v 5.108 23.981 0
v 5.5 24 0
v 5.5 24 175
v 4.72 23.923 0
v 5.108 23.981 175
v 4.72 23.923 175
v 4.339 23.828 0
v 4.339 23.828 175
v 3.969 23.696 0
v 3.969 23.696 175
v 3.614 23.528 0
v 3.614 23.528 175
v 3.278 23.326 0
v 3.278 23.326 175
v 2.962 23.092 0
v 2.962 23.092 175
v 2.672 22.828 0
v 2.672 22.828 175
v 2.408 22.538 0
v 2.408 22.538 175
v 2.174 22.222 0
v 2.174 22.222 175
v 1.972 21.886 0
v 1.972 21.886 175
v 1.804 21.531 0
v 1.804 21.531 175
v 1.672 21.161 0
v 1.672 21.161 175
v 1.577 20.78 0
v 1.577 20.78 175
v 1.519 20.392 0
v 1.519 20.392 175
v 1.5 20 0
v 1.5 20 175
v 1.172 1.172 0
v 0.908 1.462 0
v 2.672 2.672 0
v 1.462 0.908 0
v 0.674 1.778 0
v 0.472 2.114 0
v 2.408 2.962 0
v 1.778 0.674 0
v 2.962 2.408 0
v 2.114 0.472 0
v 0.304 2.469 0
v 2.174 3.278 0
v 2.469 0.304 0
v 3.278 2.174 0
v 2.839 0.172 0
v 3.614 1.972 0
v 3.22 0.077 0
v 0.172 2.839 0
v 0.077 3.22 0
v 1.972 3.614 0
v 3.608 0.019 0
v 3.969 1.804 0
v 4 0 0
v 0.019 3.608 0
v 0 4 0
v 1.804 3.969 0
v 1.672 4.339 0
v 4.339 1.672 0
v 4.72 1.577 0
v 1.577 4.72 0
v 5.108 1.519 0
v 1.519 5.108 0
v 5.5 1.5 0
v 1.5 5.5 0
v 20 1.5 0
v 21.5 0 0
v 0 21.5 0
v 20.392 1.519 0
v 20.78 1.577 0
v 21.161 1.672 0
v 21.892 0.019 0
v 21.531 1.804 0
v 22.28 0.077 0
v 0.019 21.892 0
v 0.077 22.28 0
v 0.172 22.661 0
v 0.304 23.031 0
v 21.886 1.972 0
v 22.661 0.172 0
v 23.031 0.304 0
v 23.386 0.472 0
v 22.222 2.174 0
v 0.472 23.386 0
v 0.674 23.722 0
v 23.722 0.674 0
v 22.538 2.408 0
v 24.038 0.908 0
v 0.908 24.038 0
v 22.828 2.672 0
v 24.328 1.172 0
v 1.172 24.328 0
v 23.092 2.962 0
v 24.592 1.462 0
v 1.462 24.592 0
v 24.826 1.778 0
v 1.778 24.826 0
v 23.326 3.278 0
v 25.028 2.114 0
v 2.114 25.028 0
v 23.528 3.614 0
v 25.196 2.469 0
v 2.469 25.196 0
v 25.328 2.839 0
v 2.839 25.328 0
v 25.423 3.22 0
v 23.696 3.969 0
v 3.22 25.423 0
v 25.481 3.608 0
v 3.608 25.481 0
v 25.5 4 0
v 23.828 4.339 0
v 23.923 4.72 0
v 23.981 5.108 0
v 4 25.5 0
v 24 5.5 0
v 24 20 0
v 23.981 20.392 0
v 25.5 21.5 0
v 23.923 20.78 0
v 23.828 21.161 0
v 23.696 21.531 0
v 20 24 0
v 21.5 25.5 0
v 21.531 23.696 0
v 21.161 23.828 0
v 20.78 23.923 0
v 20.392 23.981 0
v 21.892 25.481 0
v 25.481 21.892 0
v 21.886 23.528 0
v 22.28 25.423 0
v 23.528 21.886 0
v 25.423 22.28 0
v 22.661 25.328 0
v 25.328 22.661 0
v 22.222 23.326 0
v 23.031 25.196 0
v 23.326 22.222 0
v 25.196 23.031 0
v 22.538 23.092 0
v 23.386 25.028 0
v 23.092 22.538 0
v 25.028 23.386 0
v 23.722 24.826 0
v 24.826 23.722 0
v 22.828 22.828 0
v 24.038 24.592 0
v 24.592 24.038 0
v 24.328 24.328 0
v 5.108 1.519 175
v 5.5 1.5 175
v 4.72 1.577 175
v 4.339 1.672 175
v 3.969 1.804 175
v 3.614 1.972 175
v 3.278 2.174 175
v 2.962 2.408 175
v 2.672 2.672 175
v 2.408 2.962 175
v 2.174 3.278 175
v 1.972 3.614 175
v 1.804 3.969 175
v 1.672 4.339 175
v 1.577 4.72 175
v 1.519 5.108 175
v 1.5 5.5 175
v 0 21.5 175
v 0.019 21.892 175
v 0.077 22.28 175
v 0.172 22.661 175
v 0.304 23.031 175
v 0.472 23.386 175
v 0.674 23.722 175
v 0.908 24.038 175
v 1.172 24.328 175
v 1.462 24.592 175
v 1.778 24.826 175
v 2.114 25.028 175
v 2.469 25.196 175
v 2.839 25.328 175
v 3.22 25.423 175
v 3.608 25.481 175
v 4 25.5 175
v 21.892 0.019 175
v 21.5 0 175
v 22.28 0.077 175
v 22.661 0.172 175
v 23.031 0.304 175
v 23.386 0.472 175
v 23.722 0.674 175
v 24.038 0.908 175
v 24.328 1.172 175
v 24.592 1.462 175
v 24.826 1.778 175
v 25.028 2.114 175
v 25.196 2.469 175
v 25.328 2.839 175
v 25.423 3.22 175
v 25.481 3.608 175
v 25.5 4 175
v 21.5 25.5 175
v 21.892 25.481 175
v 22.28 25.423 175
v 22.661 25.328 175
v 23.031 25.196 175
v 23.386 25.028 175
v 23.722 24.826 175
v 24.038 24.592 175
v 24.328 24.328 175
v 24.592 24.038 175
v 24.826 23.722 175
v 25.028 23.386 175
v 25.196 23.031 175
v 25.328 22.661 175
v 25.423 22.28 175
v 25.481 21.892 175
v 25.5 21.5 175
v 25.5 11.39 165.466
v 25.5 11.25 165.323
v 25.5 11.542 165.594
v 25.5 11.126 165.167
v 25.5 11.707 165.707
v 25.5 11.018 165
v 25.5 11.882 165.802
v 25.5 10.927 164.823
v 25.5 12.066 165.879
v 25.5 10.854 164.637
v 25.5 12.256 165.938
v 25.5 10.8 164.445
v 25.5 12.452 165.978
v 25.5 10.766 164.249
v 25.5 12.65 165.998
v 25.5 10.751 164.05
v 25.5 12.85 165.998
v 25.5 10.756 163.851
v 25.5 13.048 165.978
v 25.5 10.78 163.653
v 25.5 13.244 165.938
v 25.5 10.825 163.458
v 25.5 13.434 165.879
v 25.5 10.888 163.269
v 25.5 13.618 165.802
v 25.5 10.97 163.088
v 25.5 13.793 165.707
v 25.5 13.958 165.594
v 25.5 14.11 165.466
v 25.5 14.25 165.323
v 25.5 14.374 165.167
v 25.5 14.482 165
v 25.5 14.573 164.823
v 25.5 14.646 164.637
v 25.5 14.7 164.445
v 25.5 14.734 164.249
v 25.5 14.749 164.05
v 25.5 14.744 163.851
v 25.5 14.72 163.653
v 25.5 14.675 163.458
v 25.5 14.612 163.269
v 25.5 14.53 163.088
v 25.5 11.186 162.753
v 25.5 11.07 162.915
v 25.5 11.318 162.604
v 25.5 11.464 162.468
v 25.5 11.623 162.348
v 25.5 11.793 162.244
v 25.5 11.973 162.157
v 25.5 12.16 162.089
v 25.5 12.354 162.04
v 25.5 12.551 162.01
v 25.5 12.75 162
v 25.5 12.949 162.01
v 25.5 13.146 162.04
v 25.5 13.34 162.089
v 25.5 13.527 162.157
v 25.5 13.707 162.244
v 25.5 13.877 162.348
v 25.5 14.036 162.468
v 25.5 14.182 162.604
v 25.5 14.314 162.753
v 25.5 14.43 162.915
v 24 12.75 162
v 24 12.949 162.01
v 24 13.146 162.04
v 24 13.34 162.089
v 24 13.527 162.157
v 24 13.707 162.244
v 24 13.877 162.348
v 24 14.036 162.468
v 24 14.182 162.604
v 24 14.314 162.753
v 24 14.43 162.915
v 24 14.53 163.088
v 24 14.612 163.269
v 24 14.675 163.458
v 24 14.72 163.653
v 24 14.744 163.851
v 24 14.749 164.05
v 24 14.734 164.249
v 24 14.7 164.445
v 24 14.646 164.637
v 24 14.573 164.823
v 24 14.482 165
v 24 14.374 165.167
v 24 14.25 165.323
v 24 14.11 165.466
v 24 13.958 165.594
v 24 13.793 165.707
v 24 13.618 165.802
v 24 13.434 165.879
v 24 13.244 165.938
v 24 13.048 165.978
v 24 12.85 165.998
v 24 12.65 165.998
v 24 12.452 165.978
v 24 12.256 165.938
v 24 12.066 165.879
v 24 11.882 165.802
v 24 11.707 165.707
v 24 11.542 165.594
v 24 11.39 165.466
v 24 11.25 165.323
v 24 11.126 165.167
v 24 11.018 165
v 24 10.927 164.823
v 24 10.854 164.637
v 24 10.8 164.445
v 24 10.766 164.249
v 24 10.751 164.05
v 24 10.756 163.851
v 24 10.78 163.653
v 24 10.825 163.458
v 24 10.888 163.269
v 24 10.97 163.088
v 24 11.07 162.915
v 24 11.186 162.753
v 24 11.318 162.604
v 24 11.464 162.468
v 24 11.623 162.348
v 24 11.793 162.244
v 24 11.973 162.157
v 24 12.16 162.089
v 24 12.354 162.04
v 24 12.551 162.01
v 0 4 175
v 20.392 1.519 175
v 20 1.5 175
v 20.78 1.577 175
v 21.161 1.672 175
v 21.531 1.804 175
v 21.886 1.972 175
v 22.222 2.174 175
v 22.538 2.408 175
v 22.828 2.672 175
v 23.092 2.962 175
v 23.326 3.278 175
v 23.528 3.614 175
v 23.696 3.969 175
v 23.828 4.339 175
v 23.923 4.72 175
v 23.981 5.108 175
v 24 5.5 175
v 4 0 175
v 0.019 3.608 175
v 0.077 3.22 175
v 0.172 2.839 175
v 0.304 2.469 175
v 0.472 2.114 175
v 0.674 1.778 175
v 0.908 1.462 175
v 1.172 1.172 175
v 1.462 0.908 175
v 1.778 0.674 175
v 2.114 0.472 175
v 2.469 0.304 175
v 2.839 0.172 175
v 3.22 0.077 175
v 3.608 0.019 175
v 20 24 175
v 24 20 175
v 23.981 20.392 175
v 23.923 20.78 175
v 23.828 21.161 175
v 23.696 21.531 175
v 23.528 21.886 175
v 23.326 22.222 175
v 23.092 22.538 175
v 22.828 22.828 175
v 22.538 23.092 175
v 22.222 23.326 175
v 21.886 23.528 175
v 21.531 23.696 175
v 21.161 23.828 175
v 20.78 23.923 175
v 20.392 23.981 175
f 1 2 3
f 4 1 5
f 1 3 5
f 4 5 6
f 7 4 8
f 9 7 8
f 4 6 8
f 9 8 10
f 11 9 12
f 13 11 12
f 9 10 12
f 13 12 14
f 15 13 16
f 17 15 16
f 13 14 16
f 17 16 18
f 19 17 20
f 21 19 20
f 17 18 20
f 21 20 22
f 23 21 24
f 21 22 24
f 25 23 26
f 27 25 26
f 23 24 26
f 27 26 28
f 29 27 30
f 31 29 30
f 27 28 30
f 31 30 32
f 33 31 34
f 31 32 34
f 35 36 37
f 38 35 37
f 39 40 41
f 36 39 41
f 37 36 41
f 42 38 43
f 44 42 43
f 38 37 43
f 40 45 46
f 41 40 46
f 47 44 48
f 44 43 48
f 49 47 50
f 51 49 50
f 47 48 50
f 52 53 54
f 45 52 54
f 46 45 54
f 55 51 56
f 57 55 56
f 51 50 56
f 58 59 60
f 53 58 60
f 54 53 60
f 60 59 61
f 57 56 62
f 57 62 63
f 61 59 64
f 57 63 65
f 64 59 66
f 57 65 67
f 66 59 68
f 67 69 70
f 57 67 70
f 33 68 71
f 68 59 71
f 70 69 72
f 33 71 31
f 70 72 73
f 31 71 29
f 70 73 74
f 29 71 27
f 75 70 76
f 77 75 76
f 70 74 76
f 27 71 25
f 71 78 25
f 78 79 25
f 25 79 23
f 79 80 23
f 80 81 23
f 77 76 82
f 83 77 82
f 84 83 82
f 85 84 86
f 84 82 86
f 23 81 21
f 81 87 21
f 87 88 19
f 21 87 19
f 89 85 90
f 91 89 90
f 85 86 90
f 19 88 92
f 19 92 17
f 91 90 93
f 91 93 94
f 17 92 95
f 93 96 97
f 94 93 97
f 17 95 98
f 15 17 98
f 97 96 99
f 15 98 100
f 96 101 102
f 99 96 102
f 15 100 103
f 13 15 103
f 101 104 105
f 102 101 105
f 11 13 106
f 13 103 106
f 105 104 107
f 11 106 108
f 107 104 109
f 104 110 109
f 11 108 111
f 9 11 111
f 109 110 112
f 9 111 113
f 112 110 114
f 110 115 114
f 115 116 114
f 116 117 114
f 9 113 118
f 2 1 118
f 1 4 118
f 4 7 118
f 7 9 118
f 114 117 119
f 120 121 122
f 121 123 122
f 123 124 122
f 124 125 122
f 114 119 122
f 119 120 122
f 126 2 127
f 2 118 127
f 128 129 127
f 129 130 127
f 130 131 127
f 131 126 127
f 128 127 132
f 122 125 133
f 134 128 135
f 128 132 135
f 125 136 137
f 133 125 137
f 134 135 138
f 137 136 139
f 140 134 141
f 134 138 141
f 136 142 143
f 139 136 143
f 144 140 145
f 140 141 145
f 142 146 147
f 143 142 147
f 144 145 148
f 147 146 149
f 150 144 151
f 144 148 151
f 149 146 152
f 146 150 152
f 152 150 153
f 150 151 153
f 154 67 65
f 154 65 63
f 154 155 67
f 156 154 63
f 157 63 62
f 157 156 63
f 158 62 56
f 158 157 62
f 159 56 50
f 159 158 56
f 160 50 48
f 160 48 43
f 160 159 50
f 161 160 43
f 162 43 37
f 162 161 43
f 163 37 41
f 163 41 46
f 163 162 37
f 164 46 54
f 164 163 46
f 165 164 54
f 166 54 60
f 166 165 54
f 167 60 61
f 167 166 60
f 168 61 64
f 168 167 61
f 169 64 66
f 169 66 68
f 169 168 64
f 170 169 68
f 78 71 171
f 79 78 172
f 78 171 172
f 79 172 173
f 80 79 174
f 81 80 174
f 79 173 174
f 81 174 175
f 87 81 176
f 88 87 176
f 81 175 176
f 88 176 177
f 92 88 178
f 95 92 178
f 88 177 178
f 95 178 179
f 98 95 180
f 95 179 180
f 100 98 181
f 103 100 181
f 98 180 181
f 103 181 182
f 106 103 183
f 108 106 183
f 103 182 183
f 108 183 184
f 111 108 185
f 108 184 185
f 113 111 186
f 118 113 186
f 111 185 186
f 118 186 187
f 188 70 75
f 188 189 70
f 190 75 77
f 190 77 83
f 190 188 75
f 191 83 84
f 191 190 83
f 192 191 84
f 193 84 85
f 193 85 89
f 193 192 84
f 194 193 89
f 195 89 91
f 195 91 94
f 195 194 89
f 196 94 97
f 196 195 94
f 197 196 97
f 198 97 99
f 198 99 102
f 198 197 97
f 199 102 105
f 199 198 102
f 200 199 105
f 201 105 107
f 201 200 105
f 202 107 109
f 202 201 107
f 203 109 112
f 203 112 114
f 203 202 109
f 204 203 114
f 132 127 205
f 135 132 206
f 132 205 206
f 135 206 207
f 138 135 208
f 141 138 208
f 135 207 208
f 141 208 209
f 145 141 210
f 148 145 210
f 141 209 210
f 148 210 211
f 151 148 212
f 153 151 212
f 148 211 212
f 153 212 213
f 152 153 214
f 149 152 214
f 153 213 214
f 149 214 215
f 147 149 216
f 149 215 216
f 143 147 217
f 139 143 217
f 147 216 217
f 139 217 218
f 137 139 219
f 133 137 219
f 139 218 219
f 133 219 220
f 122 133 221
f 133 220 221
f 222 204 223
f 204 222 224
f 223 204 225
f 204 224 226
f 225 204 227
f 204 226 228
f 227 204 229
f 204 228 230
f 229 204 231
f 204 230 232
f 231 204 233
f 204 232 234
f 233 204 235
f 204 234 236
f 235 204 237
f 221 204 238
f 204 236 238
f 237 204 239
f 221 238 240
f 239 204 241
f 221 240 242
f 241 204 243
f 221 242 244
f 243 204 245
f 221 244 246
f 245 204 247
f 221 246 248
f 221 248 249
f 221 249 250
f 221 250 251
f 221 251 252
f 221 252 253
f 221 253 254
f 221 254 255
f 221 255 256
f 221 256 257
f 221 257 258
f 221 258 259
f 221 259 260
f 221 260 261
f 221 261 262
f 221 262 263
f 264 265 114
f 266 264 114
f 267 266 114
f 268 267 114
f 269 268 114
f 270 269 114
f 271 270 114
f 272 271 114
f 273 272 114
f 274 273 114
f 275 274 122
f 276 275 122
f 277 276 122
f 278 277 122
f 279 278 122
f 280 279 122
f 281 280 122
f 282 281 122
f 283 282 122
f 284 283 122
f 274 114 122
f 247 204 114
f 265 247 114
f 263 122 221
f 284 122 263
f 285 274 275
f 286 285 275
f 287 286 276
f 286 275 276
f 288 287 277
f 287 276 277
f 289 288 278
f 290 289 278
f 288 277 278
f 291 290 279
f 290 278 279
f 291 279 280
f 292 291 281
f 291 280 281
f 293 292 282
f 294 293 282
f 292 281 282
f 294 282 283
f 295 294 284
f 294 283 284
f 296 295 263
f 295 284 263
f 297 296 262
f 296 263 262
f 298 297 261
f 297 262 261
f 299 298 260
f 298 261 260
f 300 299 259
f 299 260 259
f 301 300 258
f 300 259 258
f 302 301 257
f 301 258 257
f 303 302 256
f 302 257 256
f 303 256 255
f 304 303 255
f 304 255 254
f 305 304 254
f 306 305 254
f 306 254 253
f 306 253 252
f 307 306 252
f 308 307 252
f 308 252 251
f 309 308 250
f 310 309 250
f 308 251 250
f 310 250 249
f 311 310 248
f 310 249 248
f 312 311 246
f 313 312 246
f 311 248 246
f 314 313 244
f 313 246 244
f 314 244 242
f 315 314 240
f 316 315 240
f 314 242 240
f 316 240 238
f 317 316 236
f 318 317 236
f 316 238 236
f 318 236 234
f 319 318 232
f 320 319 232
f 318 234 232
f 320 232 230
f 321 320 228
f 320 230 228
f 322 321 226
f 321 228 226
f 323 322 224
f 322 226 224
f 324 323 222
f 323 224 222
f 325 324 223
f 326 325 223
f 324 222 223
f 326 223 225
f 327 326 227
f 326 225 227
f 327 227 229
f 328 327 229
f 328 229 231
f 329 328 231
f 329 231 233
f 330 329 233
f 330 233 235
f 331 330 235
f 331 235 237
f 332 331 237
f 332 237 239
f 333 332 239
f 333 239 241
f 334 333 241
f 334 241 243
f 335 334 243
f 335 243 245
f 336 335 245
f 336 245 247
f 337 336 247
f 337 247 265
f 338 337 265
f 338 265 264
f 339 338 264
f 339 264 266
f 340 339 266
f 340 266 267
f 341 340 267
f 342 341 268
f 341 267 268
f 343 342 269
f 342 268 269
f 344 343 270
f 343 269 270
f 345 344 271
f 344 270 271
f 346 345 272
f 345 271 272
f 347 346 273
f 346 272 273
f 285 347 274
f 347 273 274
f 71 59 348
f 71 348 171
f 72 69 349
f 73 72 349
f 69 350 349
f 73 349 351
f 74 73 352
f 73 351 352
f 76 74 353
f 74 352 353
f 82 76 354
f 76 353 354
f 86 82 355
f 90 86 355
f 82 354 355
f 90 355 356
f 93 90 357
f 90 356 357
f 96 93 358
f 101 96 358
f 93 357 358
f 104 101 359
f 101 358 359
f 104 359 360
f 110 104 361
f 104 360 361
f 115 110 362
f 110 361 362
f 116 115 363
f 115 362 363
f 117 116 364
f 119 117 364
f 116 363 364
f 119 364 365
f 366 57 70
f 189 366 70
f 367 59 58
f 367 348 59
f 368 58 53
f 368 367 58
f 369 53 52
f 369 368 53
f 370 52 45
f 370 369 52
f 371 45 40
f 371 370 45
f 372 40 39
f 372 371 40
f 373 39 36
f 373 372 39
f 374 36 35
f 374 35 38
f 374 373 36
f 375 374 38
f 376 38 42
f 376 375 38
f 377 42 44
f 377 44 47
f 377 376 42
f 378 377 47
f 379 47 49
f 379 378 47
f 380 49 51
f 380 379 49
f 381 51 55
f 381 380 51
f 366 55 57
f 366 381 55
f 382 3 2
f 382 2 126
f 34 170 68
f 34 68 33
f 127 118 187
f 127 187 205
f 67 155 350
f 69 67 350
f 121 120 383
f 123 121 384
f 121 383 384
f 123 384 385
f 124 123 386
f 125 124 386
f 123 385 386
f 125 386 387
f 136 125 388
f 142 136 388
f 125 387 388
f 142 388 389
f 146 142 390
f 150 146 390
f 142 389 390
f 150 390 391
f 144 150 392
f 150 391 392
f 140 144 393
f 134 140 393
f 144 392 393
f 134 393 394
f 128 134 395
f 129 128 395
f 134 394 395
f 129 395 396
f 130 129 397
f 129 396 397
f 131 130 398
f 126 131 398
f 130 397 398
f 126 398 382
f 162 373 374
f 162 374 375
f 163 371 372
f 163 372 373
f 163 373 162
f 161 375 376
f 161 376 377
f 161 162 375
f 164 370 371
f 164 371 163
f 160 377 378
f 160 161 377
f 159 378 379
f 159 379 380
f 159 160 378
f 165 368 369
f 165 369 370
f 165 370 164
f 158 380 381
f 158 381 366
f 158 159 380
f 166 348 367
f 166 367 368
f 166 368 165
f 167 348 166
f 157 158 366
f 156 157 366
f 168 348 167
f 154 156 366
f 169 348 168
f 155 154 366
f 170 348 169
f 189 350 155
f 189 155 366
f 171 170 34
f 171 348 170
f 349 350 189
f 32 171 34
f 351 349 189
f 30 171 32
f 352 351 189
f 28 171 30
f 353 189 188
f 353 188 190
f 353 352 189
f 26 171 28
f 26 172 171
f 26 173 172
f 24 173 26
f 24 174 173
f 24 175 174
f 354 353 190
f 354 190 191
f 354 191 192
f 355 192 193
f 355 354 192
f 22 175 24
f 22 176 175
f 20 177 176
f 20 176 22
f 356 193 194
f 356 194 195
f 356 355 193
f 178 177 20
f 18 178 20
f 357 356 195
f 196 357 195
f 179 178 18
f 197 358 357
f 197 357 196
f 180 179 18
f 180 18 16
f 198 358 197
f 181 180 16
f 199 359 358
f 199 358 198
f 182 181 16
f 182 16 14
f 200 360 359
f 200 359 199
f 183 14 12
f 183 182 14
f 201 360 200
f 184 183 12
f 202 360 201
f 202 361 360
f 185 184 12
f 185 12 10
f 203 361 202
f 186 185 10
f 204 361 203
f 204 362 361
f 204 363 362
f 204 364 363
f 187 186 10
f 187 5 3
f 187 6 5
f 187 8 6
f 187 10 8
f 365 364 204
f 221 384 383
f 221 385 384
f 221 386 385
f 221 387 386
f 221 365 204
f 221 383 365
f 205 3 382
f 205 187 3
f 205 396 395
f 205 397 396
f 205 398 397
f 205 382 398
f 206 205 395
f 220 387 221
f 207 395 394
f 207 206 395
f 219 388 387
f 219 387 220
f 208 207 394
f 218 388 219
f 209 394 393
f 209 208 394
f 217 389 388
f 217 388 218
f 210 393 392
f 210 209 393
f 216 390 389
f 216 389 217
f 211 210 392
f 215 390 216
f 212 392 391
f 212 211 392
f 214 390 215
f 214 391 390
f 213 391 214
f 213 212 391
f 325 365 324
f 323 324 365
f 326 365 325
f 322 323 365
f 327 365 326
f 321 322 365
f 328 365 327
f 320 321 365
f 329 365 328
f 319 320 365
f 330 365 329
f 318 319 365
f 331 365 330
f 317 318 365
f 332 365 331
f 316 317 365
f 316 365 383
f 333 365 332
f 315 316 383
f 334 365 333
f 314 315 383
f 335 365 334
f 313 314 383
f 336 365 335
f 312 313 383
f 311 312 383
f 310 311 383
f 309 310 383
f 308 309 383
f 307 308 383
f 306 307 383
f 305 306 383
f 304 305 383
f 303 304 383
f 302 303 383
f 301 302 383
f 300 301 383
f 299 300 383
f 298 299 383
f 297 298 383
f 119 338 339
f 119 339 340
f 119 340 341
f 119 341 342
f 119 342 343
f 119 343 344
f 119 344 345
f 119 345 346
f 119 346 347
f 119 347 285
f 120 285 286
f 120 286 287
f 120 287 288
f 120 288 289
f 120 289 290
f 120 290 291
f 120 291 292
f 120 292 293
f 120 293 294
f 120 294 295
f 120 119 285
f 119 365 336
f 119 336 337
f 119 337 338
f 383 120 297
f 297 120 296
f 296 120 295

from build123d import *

# Parameters (mm, degrees)
SKETCH4_W           = 25.5
SKETCH4_H           = 25.5
SKETCH4_W_2         = 22.5
SKETCH4_H_2         = 22.5
BOSS_EXTRUDE1_DEPTH = 175
SKETCH5_R           = 2
CUT_EXTRUDE1_DEPTH  = 1.5
FILLET1_R           = 4


with BuildPart() as part:
    # Sketch4 → Boss-Extrude1 (new body)
    with BuildSketch(Plane.XY):
        with Locations((12.75, 12.75)):
            Rectangle(SKETCH4_W, SKETCH4_H)
        with Locations((12.75, 12.75)):
            Rectangle(SKETCH4_W_2, SKETCH4_H_2, mode=Mode.SUBTRACT)
    extrude(amount=BOSS_EXTRUDE1_DEPTH)

    # Sketch5 → Cut-Extrude1 (cut)
    with BuildSketch(Plane(origin=(25.5, 0, 0), x_dir=(0, 0, -1), z_dir=(1, 0, 0))):
        with Locations((-164, 12.75)):
            Circle(SKETCH5_R)
    extrude(amount=-CUT_EXTRUDE1_DEPTH, mode=Mode.SUBTRACT)

    # Fillet1
    fillet1_edges = [part.edges().sort_by_distance(p)[0] for p in [
        (1.5, 1.5, 87.5),
        (24, 1.5, 87.5),
        (24, 24, 87.5),
        (1.5, 24, 87.5),
        (0, 25.5, 87.5),
        (25.5, 25.5, 87.5),
        (25.5, 0, 87.5),
        (0, 0, 87.5),
    ]]
    fillet(fillet1_edges, radius=FILLET1_R)


solid = part.part
